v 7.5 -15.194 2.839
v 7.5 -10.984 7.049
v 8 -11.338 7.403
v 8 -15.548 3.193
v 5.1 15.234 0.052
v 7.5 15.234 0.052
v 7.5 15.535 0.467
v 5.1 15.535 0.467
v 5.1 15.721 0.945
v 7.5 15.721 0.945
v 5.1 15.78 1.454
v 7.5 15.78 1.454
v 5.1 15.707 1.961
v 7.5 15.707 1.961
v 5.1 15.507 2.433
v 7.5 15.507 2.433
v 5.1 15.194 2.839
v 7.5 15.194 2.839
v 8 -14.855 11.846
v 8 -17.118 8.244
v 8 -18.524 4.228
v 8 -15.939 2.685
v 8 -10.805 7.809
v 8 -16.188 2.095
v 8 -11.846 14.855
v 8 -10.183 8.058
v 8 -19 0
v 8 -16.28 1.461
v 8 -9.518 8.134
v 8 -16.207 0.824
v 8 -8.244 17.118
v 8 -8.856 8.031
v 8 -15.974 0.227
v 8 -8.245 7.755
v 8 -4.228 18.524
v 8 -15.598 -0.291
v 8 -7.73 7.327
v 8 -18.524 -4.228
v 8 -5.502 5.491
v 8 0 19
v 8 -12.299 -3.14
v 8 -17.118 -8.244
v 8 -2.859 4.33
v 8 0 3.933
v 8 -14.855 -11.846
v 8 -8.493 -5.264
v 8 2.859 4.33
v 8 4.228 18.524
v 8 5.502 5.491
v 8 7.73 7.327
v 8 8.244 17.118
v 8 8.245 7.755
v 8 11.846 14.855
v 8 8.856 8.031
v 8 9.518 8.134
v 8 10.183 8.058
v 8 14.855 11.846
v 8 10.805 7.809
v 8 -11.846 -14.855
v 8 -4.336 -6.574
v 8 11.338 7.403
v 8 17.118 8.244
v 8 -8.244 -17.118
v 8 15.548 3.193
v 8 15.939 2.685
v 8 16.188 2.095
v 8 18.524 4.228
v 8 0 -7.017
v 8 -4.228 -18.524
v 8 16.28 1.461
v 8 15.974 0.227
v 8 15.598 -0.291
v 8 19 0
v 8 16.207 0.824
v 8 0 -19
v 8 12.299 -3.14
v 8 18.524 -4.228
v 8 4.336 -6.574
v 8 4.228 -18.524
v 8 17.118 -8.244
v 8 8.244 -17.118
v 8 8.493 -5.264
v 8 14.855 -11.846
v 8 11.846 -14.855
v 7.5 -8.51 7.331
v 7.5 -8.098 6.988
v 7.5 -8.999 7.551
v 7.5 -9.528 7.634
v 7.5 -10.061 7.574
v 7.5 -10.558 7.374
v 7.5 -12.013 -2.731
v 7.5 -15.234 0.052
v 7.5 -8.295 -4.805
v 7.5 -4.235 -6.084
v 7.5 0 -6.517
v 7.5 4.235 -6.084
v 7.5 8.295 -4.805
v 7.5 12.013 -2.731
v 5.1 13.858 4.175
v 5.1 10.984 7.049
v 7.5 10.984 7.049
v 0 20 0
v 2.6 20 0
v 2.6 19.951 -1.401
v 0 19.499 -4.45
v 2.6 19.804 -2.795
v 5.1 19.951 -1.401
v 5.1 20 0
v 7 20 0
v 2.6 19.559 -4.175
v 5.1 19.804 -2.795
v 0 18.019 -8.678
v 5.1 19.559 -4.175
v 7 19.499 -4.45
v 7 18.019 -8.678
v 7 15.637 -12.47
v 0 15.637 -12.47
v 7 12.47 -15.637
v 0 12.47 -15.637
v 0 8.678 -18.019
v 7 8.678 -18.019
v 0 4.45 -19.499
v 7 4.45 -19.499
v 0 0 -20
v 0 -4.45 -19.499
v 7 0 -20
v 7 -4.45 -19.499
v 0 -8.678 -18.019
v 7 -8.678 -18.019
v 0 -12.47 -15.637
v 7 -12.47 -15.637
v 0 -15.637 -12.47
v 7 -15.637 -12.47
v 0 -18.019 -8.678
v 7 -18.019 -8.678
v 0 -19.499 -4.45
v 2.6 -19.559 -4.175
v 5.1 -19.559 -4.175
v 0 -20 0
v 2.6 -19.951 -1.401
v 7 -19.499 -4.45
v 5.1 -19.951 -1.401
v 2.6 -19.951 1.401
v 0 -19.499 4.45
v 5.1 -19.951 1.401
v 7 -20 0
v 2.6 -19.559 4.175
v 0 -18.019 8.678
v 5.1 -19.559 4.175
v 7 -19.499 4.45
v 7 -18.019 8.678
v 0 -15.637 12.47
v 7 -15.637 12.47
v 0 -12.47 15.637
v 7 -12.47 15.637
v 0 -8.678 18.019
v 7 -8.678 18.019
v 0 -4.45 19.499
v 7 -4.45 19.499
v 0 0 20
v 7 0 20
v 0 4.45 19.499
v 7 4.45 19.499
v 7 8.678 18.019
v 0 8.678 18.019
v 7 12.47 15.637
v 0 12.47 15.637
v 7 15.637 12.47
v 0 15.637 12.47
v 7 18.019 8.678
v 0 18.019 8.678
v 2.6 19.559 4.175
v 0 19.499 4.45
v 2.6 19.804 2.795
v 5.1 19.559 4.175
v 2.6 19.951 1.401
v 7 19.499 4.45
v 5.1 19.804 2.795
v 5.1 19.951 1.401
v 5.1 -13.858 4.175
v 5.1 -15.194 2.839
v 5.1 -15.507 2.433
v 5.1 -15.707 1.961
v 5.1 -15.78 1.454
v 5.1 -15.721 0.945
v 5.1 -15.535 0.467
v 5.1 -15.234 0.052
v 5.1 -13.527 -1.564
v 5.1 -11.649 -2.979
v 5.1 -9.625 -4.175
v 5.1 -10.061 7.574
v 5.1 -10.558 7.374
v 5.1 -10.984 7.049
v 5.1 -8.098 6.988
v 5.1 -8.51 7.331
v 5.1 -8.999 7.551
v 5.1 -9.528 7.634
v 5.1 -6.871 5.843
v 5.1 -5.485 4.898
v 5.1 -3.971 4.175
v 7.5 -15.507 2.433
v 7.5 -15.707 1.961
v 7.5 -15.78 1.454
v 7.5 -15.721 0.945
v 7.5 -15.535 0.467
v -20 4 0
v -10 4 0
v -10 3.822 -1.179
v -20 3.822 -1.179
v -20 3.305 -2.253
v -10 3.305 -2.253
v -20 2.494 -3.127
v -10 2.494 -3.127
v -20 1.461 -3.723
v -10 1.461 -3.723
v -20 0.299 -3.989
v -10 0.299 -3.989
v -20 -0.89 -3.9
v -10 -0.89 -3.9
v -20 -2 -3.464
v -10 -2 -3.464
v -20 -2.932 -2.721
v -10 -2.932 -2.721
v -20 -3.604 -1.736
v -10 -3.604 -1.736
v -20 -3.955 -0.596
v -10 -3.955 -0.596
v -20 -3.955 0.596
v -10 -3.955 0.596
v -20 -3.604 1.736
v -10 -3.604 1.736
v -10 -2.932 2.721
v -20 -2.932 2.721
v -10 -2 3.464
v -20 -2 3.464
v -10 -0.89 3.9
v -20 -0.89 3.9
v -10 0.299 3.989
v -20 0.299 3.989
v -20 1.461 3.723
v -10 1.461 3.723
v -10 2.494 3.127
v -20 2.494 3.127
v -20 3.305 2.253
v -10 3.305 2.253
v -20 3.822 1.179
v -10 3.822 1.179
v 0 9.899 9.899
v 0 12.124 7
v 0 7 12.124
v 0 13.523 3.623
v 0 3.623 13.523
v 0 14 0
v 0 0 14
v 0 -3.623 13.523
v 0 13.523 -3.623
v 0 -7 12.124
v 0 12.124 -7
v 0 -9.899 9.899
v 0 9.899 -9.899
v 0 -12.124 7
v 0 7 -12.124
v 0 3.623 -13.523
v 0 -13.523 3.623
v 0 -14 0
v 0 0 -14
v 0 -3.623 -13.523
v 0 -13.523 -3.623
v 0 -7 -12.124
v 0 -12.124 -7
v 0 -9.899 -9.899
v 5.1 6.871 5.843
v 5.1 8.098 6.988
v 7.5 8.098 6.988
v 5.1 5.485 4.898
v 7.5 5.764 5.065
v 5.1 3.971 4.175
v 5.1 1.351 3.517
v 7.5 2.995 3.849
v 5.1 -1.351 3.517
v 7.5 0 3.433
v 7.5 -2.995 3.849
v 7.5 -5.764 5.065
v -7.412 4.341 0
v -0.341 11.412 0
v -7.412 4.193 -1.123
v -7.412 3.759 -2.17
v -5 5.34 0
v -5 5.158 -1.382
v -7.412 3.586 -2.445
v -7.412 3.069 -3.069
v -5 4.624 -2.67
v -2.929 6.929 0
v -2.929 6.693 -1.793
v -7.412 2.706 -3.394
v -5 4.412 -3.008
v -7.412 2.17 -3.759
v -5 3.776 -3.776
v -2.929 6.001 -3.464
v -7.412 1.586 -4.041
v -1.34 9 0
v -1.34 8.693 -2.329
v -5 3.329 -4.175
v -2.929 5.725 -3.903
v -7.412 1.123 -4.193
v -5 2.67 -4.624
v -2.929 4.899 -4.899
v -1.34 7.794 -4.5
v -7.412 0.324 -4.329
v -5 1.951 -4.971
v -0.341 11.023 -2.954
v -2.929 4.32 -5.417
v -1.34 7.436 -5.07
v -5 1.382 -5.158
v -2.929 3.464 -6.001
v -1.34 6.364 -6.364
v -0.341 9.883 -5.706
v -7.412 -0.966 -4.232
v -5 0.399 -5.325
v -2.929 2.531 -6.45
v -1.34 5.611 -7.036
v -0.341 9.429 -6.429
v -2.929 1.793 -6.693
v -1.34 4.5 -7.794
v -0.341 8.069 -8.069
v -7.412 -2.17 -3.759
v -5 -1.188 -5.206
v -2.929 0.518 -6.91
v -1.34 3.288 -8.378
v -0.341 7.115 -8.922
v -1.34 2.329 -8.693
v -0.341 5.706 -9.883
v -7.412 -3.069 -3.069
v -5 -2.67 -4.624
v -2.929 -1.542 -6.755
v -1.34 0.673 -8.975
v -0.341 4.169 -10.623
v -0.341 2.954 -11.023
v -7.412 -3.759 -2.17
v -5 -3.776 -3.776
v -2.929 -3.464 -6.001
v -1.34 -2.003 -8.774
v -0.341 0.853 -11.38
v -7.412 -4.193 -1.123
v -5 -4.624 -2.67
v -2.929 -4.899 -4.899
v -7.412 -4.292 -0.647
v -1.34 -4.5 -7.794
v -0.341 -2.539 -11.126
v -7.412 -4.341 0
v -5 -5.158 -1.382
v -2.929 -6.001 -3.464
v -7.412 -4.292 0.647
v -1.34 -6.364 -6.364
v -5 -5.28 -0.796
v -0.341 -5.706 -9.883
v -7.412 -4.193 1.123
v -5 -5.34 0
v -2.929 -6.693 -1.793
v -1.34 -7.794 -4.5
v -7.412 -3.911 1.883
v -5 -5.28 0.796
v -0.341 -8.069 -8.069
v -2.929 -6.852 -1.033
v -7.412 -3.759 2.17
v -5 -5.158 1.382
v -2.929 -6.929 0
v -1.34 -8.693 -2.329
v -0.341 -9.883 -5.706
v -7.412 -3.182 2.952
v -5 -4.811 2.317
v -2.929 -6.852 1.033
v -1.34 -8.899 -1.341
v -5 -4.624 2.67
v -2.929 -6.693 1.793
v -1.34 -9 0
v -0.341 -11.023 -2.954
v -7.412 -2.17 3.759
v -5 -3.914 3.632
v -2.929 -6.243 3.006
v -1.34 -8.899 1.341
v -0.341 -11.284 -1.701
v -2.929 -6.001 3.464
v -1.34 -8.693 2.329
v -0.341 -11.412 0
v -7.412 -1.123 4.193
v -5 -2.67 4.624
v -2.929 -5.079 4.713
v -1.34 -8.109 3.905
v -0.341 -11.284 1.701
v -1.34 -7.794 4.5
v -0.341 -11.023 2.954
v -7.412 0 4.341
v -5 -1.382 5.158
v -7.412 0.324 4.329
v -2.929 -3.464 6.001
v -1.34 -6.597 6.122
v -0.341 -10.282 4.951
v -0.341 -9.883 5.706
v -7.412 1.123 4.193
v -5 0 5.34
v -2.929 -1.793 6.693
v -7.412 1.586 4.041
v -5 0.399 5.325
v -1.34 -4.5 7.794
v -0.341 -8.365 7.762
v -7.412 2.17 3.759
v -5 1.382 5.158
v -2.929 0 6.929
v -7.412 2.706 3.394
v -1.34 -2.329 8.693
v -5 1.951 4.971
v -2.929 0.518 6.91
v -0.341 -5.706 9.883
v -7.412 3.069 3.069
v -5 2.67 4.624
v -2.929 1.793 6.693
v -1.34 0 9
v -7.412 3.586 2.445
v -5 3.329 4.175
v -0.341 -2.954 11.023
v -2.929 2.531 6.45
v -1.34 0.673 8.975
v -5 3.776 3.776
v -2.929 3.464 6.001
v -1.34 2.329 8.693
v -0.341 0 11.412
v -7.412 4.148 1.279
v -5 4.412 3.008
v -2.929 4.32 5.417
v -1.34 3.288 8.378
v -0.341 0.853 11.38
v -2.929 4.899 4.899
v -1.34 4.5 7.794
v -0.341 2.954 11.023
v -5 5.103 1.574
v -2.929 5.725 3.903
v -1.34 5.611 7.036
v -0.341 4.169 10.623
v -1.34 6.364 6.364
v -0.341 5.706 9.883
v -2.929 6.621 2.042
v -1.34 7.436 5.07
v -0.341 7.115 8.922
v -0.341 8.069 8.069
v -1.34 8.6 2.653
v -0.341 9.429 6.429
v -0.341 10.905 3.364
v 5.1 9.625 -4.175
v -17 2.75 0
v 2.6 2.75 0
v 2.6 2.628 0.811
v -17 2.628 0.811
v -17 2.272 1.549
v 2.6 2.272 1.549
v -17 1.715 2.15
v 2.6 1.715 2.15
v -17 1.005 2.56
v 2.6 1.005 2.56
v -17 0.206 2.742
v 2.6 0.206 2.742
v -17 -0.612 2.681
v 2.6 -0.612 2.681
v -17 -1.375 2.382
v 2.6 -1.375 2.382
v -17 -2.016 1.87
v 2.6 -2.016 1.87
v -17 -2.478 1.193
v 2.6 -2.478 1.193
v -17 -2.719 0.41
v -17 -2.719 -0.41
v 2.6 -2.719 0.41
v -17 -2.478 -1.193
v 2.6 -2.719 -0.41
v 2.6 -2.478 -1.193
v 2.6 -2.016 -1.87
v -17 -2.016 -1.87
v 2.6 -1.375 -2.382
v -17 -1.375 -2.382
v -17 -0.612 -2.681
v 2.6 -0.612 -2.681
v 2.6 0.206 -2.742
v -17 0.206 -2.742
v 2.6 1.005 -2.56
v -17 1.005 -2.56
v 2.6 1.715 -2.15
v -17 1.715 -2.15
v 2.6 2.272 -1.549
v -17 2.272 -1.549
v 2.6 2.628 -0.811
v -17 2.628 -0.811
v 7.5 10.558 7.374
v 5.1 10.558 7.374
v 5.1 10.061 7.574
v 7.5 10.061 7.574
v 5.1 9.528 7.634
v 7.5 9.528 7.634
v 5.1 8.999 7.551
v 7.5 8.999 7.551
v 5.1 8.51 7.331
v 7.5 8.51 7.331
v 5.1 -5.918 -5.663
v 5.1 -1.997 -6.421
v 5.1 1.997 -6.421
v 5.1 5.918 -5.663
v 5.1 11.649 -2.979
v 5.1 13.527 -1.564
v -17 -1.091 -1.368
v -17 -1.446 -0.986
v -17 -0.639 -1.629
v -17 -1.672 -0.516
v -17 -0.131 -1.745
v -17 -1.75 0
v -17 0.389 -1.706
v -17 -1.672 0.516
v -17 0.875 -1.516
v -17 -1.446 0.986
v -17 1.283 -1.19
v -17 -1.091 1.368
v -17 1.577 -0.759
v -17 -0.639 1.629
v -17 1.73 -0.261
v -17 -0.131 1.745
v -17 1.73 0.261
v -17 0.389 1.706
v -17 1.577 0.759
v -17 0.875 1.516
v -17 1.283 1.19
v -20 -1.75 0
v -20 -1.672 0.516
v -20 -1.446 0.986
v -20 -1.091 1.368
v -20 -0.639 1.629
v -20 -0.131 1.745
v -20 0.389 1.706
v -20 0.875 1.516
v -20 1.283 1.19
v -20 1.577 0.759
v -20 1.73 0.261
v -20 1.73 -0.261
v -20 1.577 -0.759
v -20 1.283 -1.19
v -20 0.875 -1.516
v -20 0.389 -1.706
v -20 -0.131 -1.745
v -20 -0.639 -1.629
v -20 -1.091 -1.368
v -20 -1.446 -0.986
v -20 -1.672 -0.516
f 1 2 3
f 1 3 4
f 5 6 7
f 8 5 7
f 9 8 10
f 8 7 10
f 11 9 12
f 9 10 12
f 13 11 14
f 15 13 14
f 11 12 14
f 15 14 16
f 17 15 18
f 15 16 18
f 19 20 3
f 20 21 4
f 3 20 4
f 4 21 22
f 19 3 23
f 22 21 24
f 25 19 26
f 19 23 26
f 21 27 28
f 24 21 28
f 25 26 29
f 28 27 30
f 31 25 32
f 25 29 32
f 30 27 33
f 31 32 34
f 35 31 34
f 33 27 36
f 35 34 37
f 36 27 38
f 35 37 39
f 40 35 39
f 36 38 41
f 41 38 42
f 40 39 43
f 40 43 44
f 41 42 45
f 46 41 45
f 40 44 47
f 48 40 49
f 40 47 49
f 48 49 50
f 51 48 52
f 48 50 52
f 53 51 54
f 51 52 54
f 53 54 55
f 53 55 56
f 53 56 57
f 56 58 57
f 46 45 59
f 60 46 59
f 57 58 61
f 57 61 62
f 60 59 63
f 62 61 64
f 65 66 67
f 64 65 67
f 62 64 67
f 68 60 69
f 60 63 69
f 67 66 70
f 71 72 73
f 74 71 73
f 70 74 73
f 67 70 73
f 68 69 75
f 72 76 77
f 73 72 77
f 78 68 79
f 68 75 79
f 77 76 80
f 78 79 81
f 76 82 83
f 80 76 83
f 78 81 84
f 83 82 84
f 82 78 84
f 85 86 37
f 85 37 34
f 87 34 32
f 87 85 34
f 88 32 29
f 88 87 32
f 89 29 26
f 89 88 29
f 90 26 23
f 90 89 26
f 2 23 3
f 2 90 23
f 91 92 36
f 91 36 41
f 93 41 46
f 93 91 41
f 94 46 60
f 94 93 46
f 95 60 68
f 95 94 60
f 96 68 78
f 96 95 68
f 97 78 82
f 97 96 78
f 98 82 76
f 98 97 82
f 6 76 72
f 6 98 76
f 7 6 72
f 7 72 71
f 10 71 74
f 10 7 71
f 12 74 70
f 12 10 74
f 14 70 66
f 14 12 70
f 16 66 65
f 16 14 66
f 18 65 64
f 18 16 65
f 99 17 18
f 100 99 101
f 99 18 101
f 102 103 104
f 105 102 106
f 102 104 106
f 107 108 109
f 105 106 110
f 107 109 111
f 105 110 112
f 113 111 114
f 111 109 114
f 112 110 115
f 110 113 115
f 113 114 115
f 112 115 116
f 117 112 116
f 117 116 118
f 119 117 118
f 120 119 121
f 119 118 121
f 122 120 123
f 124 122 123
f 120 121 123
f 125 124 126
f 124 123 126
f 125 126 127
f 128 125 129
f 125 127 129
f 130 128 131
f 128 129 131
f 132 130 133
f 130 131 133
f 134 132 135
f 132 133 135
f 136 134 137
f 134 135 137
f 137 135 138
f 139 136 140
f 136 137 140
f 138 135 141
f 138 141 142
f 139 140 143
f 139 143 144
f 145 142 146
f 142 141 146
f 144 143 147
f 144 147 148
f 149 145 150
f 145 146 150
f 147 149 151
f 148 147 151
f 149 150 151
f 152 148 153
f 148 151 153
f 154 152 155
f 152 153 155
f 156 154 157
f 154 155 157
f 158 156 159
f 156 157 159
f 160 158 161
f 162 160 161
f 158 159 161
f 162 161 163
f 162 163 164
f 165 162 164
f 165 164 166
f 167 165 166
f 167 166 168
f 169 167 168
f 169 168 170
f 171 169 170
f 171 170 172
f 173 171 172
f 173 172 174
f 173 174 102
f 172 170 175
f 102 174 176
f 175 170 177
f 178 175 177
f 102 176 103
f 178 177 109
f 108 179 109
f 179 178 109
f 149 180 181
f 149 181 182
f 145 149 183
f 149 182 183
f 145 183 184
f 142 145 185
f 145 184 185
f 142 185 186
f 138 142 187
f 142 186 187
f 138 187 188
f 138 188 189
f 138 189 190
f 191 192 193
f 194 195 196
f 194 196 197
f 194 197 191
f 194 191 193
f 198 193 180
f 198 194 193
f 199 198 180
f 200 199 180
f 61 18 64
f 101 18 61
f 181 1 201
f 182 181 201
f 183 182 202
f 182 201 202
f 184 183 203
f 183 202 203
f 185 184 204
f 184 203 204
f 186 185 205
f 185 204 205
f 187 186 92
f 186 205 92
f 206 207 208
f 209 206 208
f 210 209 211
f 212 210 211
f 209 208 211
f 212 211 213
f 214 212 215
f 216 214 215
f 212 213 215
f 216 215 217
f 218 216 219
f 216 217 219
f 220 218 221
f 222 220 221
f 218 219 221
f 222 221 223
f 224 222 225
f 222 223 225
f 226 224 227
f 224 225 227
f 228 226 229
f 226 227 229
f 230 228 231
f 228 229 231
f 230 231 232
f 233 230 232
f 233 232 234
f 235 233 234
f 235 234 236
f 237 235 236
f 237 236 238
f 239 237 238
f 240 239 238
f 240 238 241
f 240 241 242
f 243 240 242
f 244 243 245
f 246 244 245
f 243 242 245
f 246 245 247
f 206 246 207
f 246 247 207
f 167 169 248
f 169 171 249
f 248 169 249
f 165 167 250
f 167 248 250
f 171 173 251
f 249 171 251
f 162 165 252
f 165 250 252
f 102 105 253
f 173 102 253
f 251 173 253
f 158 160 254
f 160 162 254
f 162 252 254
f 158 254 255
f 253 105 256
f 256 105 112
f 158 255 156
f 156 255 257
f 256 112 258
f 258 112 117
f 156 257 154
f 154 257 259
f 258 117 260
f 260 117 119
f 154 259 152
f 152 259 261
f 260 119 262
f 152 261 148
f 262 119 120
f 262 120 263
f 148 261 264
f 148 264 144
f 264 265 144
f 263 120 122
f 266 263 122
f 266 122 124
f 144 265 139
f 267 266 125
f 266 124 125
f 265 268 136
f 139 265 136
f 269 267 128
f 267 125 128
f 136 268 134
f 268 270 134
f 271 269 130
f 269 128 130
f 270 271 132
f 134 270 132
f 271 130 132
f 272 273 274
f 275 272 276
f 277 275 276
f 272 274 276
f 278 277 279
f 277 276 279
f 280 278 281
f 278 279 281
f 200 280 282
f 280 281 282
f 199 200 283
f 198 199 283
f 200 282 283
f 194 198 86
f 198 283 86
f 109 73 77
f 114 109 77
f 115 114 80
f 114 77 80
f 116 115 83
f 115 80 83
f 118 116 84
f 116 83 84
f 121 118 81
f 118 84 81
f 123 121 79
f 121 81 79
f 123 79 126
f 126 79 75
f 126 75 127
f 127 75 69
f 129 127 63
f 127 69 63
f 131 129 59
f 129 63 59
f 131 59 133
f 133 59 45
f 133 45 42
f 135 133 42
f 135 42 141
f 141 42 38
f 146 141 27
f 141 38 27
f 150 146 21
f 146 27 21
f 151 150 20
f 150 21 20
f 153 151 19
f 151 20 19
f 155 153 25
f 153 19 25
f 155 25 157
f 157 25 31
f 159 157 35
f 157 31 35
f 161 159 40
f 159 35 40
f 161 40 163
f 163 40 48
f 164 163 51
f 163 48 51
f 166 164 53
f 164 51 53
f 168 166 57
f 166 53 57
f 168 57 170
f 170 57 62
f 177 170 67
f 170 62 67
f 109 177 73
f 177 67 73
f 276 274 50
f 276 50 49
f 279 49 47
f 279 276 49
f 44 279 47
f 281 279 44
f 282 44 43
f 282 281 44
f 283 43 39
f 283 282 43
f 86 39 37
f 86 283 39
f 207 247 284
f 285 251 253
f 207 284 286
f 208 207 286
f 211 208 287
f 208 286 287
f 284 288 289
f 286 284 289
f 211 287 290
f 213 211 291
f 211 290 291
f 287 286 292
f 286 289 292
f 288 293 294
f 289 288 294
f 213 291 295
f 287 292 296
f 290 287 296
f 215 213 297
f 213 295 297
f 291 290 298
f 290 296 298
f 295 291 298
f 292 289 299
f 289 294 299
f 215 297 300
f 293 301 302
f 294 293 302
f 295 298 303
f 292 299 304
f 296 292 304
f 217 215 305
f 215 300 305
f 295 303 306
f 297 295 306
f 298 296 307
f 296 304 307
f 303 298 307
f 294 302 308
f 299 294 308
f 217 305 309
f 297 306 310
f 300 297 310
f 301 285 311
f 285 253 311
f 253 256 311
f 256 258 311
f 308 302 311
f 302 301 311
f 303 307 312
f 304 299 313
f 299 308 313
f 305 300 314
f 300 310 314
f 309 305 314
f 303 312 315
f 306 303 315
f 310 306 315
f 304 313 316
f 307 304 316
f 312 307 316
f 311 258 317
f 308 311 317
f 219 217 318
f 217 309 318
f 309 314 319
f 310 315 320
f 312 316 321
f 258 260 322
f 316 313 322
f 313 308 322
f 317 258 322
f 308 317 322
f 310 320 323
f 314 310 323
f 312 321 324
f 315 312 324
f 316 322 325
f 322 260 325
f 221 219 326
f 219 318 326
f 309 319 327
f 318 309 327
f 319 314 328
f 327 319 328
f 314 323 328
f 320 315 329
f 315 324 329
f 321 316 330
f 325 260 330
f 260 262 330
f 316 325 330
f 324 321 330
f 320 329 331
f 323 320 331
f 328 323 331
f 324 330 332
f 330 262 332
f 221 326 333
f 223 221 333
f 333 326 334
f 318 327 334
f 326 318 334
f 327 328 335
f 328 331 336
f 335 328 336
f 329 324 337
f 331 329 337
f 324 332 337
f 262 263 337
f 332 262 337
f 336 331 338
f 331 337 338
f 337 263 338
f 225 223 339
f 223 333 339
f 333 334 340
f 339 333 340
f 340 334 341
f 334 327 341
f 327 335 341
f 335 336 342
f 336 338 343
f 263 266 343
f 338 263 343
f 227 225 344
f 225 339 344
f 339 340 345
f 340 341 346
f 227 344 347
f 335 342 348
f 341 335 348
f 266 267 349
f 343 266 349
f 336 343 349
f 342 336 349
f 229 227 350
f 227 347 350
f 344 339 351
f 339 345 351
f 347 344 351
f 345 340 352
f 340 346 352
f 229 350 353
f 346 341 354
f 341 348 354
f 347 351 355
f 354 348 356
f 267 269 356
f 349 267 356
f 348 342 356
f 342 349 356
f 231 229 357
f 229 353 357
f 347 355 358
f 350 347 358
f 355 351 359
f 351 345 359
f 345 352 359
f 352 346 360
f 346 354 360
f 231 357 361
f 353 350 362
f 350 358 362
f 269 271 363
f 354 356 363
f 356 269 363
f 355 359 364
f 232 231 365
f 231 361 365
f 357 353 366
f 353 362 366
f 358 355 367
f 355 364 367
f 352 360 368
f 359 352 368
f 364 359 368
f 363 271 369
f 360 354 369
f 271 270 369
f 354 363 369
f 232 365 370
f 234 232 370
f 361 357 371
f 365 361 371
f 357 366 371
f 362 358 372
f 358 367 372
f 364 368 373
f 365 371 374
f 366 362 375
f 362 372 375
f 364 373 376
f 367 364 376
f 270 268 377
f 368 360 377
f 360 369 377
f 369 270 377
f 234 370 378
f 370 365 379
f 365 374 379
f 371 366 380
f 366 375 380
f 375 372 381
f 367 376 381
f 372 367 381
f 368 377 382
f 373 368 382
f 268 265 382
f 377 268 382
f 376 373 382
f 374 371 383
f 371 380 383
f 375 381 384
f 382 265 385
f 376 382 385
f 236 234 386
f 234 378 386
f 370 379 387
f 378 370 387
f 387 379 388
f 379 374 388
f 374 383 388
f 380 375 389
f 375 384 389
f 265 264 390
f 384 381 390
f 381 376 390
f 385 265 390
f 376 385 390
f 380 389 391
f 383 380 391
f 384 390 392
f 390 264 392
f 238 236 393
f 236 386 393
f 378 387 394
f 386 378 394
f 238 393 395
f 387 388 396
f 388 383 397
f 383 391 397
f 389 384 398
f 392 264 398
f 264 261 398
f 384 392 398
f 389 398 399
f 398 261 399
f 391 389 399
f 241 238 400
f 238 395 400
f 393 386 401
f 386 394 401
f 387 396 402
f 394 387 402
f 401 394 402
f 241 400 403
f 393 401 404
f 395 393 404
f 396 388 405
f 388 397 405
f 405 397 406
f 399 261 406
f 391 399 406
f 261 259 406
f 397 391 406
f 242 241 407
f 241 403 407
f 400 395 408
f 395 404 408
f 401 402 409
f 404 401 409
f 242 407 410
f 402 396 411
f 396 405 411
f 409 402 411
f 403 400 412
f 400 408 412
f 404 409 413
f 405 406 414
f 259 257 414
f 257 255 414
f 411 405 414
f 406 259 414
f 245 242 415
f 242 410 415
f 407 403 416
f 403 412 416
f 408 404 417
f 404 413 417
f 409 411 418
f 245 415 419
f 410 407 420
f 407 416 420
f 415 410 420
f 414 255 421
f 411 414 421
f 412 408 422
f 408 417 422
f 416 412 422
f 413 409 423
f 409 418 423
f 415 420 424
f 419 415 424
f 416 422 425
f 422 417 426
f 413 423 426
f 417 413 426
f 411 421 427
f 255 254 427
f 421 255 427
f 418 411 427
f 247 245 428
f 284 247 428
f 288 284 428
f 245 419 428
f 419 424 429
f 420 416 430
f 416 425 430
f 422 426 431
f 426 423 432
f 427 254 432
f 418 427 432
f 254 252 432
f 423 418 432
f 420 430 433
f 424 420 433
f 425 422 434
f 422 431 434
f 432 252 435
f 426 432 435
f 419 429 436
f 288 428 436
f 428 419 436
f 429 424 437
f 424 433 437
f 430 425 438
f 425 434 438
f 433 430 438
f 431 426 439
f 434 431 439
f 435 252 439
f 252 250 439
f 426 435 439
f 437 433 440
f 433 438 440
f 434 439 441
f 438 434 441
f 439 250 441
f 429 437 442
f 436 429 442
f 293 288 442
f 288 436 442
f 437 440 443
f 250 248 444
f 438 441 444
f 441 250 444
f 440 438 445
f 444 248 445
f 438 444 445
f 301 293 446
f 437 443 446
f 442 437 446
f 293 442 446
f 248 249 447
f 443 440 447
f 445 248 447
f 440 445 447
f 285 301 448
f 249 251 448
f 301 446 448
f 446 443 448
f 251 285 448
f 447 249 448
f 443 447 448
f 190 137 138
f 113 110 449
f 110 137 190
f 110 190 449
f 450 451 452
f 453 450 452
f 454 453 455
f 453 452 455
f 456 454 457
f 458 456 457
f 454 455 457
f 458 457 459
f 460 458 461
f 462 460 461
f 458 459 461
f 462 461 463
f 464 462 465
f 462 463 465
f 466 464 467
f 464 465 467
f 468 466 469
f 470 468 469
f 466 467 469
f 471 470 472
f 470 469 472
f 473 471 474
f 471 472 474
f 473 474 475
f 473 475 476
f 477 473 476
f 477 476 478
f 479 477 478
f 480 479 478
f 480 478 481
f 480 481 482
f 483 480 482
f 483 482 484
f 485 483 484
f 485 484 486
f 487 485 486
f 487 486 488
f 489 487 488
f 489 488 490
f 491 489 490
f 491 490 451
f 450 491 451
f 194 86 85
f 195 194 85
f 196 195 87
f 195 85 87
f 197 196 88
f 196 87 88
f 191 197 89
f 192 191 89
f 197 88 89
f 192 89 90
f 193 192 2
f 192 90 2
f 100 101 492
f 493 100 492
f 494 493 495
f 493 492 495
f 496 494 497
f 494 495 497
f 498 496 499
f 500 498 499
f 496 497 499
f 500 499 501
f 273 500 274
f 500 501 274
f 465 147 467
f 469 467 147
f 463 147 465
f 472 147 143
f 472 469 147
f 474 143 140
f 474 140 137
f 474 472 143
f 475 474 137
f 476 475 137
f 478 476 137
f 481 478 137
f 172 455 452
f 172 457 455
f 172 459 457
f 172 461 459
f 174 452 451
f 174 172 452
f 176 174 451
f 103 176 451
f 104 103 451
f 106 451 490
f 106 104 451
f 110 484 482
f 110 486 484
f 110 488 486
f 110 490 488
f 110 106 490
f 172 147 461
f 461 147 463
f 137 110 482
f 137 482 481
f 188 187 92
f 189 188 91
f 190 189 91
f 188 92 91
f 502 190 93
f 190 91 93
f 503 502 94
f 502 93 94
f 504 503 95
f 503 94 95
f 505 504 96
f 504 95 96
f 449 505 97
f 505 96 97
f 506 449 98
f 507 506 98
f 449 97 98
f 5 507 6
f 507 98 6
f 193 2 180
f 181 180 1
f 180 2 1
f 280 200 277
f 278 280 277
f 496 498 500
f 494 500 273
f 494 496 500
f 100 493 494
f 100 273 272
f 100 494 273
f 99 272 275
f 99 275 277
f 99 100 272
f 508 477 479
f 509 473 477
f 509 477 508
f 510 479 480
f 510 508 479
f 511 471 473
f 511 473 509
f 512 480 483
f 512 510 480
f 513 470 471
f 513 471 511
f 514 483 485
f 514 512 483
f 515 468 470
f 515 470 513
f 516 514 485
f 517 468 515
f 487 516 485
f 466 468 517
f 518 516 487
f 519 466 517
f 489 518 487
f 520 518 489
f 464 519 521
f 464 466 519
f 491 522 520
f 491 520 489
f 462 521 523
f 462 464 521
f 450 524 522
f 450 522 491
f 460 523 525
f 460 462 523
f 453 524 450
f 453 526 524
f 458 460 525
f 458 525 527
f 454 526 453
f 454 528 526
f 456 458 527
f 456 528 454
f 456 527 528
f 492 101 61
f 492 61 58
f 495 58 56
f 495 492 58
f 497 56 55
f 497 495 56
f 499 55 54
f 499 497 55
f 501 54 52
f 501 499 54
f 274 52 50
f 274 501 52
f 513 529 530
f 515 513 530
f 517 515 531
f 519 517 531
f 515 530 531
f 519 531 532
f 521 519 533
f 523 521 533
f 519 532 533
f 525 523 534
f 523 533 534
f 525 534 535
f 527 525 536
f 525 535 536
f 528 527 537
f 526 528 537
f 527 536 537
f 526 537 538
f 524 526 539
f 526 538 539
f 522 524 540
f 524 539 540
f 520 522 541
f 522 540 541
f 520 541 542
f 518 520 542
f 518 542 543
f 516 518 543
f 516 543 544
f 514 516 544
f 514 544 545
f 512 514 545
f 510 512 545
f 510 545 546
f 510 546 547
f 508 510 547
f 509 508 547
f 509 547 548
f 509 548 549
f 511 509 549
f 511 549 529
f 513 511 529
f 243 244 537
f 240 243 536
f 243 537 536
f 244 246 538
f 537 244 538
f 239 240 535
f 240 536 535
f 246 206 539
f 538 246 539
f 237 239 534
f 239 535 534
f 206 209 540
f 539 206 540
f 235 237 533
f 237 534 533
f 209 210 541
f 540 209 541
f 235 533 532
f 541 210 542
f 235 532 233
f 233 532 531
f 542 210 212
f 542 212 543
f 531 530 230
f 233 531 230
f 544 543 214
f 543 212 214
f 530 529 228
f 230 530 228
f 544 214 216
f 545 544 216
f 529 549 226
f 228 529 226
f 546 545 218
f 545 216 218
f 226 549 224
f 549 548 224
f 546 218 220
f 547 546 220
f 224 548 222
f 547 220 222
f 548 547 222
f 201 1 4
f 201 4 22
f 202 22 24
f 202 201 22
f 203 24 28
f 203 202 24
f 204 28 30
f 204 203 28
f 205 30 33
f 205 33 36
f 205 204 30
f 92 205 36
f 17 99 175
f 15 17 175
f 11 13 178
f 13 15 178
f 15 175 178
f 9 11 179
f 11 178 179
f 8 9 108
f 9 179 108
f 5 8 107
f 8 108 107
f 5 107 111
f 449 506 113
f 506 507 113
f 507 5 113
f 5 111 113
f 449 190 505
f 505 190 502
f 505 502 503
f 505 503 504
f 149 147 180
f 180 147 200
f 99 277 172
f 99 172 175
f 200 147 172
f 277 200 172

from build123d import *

# Parameters (mm, degrees)
CORTAR_EXTRUIR1_DEPTH = 2.9
REDONDEO1_R           = 10
CORTAR_EXTRUIR2_REACH = 41.799
CROQUIS3_R            = 1.75
CROQUIS4_R            = 2.75
CORTAR_EXTRUIR3_DEPTH = 22.1
CHAFL_N1_SIZE         = 1
CHAFL_N2_SIZE         = 0.5
CROQUIS6_W            = 2.5
CROQUIS6_H            = 8.35
CORTAR_EXTRUIR5_DEPTH = 25


with BuildPart() as part:
    # Croquis1 → Revolución1 (revolve)
    with BuildSketch(Plane.XY):
        Polygon((-20, 0), (-20, 4), (0, 4), (0, 20), (8, 20), (8, 0), align=None)
    revolve(axis=Axis((8, 0, 0), (-1, 0, 0)))

    # Croquis2 → Cortar-Extruir1 (cut)
    with BuildSketch(Plane(origin=(8, 0, 0), x_dir=(0, 0, -1), z_dir=(1, 0, 0))):
        with BuildLine():
            Line((-2.839199656, 15.194118815), (-7.049029232, 10.984289239))
            ThreePointArc((-7.049029232, 10.984289239), (-7.634375098, 9.528098398), (-6.988431485, 8.097756342))
            ThreePointArc((-6.988431485, 8.097756342), (-3.433318471, 0), (-6.988431485, -8.097756342))
            ThreePointArc((-6.988431485, -8.097756342), (-7.634375098, -9.528098398), (-7.049029232, -10.984289239))
            Line((-7.049029232, -10.984289239), (-2.839199656, -15.194118815))
            ThreePointArc((-2.839199656, -15.194118815), (-1.453779812, -15.779697972), (-0.052075025, -15.234248815))
            ThreePointArc((-0.052075025, -15.234248815), (6.516681529, 0), (-0.052075025, 15.234248815))
            ThreePointArc((-0.052075025, 15.234248815), (-1.453779812, 15.779697972), (-2.839199656, 15.194118815))
        make_face()
    extrude(amount=-CORTAR_EXTRUIR1_DEPTH, mode=Mode.SUBTRACT)

    # Redondeo1
    redondeo1_edges = [part.edges().sort_by_distance(p)[0] for p in [
        (0, -4, 0),
    ]]
    fillet(redondeo1_edges, radius=REDONDEO1_R)

    # Croquis3 → Cortar-Extruir2 (cut, up to next)
    with BuildSketch(Plane.ZY.offset(20), mode=Mode.PRIVATE) as cortar_extruir2_sk1:
        with Locations(Location((0, 0, 0), (0, 0, 270))):
            Circle(CROQUIS3_R)
    cortar_extruir2_tool1 = extrude(cortar_extruir2_sk1.sketch, amount=-CORTAR_EXTRUIR2_REACH, mode=Mode.PRIVATE) & part.part
    add(cortar_extruir2_tool1.solids().sort_by_distance((-20, 0, 0))[0], mode=Mode.SUBTRACT)

    # Croquis4 → Cortar-Extruir3 (cut)
    with BuildSketch(Plane(origin=(5.1, 0, 0), x_dir=(0, 0, -1), z_dir=(1, 0, 0))):
        with Locations(Location((0, 0, 0), (0, 0, 90))):
            Circle(CROQUIS4_R)
    extrude(amount=-CORTAR_EXTRUIR3_DEPTH, mode=Mode.SUBTRACT)

    # Chaflán1
    chafl_n1_edges = [part.edges().sort_by_distance(p)[0] for p in [
        (8, -20, 0),
    ]]
    chamfer(chafl_n1_edges, length=CHAFL_N1_SIZE)

    # Chaflán2
    chafl_n2_edges = [part.edges().sort_by_distance(p)[0] for p in [
        (8, -15.779697972, 1.453779812),
        (8, 0, -6.516681529),
        (8, 15.779697972, 1.453779812),
        (8, 13.089204027, 4.944114444),
        (8, 9.528098398, 7.634375098),
        (8, 0, 3.433318471),
        (8, -9.528098398, 7.634375098),
        (8, -13.089204027, 4.944114444),
    ]]
    chamfer(chafl_n2_edges, length=CHAFL_N2_SIZE)

    # Croquis6 → Cortar-Extruir5 (cut, symmetric)
    with BuildSketch(Plane(origin=(0, 0, 0), x_dir=(1, 0, 0), z_dir=(0, 1, 0))):
        with Locations((3.85, 0)):
            Rectangle(CROQUIS6_W, CROQUIS6_H)
    extrude(amount=CORTAR_EXTRUIR5_DEPTH, both=True, mode=Mode.SUBTRACT)


solid = part.part
